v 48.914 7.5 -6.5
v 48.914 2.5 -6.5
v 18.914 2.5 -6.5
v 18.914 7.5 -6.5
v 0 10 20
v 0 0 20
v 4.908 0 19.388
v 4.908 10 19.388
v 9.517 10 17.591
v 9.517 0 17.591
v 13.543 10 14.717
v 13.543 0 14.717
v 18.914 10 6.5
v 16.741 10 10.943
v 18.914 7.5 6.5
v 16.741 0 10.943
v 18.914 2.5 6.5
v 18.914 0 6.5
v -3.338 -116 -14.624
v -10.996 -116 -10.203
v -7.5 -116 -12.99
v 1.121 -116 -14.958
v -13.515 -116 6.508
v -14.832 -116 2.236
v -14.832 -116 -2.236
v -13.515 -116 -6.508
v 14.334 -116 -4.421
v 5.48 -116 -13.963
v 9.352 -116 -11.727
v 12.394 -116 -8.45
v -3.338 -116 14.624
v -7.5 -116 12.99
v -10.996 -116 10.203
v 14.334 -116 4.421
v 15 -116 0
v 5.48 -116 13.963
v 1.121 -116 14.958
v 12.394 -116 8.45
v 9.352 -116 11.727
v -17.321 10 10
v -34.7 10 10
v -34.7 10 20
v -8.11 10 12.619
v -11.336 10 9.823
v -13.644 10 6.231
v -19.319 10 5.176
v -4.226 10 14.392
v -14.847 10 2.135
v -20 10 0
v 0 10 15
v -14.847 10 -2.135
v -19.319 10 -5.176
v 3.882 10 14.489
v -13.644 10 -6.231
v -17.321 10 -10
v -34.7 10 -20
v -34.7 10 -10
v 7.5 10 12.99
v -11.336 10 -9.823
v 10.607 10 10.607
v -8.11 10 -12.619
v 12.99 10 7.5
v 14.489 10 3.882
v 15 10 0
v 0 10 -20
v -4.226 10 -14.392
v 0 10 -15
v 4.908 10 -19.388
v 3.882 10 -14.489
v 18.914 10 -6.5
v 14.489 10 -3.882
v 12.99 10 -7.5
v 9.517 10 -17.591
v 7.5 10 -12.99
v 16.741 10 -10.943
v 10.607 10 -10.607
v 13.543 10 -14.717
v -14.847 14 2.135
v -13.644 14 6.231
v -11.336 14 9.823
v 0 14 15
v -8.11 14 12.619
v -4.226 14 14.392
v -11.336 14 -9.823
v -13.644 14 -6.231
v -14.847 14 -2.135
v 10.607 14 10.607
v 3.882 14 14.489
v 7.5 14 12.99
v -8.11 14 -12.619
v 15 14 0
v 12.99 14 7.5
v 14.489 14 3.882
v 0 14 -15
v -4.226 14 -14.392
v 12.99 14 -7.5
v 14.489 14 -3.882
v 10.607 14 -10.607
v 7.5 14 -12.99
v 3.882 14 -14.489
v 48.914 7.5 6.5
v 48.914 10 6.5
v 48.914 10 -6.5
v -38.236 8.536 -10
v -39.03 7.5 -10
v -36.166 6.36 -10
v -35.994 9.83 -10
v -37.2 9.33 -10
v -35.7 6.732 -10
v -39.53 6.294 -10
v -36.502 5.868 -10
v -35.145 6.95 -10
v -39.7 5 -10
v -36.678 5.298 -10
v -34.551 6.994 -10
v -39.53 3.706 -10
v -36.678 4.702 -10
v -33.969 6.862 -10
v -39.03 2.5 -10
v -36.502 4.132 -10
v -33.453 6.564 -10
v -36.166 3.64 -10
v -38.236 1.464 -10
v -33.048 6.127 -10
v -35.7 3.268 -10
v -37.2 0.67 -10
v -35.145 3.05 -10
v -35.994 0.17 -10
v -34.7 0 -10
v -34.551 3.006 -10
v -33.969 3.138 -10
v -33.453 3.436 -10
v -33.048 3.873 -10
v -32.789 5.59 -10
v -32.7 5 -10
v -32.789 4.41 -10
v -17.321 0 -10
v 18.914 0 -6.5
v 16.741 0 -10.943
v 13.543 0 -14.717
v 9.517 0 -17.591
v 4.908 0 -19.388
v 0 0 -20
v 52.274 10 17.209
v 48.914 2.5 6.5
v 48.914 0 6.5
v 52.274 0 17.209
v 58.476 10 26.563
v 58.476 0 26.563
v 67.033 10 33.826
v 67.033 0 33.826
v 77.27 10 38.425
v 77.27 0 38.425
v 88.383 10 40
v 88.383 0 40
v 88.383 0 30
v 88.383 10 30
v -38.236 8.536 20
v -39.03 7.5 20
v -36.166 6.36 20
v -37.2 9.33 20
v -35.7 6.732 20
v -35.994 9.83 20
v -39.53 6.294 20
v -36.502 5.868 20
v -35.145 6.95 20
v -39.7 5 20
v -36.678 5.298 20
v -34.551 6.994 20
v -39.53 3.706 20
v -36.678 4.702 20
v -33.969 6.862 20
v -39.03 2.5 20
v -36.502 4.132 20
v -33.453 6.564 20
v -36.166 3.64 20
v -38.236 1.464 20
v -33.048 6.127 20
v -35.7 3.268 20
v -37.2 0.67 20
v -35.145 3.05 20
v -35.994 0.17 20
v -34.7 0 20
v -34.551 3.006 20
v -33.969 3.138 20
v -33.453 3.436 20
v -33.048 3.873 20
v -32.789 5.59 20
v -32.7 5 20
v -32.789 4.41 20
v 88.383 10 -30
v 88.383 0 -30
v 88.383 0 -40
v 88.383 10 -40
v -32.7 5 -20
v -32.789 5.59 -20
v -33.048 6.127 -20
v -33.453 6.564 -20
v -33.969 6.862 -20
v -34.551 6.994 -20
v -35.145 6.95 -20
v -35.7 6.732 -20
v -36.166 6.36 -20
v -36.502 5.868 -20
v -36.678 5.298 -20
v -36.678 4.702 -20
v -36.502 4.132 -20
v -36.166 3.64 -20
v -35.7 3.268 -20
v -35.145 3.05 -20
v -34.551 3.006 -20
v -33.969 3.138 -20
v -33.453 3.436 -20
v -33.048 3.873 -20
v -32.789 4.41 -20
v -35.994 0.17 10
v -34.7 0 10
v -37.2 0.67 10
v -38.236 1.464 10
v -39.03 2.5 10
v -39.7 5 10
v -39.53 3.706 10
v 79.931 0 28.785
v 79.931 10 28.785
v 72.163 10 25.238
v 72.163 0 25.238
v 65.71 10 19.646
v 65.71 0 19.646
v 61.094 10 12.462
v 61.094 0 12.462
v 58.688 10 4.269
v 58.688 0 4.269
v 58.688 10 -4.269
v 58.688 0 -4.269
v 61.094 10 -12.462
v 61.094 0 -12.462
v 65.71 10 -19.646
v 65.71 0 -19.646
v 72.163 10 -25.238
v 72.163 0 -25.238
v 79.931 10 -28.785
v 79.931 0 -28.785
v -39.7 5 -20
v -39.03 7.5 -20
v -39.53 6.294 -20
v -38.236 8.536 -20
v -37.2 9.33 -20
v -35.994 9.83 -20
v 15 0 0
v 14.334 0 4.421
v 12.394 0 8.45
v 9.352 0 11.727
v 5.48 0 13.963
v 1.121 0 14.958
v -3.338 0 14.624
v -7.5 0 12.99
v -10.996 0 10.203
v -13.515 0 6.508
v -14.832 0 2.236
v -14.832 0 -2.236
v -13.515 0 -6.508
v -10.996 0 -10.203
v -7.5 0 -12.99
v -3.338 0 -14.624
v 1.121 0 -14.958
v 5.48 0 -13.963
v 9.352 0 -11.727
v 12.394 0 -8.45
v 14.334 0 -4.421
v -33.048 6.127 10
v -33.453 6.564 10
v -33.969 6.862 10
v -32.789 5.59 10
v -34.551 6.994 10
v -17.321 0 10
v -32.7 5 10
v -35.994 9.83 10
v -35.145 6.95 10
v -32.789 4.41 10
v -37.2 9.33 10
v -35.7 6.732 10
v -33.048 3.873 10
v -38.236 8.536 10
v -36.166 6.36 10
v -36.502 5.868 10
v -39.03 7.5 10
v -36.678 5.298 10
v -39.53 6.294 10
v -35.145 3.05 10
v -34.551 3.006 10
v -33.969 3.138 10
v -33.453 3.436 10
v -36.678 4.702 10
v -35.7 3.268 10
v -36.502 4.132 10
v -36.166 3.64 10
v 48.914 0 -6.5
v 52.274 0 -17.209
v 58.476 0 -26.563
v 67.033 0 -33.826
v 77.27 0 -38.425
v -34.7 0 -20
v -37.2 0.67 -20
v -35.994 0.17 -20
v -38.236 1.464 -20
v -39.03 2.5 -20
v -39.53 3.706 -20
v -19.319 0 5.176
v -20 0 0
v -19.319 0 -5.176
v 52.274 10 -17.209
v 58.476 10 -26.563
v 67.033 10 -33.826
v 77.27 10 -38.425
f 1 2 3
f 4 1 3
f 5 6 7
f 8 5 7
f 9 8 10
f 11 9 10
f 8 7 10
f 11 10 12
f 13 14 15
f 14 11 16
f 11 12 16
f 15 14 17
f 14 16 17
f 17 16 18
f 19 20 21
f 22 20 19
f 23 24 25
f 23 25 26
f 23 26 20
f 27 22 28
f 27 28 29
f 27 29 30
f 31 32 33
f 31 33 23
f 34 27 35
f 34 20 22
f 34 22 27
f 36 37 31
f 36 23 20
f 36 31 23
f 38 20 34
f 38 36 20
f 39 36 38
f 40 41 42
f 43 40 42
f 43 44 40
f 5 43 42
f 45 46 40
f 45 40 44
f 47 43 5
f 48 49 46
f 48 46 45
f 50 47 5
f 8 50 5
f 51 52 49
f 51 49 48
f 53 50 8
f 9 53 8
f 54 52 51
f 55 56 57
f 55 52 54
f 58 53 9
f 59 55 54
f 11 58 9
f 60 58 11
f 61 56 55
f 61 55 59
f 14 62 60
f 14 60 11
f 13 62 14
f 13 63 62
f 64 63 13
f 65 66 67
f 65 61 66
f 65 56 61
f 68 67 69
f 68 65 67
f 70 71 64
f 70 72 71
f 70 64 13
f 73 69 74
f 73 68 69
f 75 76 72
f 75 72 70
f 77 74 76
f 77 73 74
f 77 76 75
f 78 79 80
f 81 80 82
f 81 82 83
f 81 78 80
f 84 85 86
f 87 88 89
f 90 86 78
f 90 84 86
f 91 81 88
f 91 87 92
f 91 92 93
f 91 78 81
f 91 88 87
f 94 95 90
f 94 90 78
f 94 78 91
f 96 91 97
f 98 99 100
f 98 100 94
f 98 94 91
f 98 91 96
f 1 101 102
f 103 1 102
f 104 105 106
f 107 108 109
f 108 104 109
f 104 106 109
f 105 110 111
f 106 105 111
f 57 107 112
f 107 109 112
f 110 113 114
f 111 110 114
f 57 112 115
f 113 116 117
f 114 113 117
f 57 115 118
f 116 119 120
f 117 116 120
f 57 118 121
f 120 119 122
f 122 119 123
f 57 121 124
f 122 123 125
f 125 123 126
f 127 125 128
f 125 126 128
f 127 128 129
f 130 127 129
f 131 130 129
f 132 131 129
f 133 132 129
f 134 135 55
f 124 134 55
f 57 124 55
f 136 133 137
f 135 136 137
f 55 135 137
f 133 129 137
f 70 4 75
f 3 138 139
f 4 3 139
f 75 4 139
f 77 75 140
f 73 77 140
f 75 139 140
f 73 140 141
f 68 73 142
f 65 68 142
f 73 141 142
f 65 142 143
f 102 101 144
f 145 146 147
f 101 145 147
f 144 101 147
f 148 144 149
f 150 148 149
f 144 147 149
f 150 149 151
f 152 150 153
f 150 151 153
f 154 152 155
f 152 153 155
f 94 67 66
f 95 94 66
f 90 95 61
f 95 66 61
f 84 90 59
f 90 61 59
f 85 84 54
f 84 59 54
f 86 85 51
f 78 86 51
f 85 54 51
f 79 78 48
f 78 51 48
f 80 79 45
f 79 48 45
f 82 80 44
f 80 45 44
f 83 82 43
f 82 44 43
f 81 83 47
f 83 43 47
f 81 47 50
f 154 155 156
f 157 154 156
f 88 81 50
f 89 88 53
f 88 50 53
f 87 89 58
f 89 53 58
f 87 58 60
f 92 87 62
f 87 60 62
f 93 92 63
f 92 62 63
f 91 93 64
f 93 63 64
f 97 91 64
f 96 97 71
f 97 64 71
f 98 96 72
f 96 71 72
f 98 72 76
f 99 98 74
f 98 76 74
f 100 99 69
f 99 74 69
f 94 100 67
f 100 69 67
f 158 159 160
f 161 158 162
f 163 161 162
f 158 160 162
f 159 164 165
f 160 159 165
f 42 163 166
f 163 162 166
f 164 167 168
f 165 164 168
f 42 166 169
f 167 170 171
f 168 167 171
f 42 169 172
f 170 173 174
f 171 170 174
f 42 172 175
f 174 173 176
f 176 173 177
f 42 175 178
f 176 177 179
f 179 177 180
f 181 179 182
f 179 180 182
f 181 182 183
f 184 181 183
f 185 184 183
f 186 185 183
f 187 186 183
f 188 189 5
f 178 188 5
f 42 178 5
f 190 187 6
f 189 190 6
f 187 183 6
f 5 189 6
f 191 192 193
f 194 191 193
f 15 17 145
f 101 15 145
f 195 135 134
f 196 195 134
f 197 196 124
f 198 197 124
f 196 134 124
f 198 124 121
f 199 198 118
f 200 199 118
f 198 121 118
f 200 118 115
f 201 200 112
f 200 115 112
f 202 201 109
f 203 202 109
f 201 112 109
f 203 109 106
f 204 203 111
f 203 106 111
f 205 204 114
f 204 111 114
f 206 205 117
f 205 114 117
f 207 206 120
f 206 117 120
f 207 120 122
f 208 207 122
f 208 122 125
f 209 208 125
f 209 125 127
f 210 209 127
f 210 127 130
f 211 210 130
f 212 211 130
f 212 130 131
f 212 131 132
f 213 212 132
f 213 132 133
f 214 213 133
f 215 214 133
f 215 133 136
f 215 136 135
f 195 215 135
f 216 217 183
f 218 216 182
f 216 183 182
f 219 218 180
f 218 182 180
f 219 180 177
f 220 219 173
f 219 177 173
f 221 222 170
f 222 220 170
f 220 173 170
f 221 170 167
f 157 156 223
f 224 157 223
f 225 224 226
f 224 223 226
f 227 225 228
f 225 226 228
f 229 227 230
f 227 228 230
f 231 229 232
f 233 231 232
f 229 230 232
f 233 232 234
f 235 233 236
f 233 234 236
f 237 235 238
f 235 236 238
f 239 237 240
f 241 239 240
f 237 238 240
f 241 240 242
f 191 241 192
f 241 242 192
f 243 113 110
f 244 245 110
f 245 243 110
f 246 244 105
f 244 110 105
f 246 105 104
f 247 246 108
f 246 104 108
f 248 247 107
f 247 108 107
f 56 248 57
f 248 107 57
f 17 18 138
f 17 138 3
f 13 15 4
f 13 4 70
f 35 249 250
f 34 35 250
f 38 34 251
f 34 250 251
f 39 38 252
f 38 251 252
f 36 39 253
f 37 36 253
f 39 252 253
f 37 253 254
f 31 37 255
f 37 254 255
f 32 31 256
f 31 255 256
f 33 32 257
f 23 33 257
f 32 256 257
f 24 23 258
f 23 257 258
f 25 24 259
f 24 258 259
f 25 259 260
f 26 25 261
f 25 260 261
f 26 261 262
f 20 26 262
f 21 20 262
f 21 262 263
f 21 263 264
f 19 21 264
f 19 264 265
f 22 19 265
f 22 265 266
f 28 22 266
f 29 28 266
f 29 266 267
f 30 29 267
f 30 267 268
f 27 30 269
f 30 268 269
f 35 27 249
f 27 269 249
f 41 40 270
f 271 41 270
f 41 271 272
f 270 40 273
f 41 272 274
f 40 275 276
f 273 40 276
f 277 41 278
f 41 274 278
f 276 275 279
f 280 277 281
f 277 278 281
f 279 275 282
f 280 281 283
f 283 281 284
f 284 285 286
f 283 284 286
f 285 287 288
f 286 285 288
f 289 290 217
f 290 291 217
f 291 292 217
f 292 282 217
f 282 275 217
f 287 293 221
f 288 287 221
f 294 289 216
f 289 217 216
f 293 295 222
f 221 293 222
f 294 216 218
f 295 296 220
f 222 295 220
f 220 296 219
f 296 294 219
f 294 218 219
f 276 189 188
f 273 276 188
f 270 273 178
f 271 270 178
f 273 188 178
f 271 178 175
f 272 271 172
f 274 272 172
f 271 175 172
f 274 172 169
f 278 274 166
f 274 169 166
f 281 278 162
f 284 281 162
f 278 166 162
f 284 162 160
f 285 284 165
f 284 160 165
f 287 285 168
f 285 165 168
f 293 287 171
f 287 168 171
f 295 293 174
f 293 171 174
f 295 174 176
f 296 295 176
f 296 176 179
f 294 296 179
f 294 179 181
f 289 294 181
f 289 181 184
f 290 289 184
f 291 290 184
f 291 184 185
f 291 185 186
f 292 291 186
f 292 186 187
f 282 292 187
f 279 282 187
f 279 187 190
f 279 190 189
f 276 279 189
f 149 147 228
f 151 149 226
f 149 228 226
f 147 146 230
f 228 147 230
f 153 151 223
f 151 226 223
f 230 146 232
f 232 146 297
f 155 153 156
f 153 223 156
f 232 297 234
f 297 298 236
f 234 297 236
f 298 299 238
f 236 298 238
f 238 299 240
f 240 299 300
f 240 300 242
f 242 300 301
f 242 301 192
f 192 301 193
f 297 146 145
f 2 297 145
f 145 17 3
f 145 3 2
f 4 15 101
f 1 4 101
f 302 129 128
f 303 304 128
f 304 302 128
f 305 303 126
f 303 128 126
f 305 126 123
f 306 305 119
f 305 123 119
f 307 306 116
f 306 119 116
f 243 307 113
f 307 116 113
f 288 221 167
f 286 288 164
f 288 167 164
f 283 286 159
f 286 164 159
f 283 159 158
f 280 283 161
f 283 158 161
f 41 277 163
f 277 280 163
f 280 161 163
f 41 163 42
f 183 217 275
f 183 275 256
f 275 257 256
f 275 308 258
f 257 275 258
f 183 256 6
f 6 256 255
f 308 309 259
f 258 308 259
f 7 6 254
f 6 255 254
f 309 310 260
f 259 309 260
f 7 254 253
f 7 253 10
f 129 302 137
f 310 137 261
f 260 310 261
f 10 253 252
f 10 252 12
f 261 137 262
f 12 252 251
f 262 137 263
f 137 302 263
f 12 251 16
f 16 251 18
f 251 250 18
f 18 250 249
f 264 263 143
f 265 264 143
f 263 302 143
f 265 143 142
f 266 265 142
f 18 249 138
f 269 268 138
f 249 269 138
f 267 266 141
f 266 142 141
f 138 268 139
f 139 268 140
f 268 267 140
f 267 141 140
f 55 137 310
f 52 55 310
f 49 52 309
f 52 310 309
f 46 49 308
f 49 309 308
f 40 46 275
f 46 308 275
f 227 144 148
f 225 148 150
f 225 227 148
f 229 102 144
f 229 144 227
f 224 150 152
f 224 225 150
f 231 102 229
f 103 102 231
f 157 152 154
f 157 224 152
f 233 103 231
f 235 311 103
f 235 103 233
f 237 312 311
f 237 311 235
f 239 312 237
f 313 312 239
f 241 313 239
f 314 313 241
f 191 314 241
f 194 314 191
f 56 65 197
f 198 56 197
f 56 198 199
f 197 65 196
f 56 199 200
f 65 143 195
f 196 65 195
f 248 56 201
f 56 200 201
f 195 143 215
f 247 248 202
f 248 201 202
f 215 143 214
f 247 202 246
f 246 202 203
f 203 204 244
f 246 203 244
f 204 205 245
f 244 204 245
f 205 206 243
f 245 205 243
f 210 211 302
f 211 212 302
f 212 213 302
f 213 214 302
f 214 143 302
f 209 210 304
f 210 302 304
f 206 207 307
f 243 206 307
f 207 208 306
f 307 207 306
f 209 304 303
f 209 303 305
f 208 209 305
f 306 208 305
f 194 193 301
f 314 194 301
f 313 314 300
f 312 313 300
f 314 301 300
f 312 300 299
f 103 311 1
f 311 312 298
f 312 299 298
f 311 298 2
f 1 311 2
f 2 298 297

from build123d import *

# Parameters (mm, degrees)
SKETCH2_R               = 15
BOSS_EXTRUDE3_DEPTH     = 10
SKETCH4_R               = 2
CUT_EXTRUDE2_DEPTH      = 21
CUT_EXTRUDE2_DEPTH_BACK = 61
BOSS_EXTRUDE5_DEPTH     = 14
SKETCH5_R               = 15
BOSS_EXTRUDE6_DEPTH     = 116
SKETCH6_W               = 30
SKETCH6_H               = 2.5
CUT_EXTRUDE3_DEPTH      = 34.5
CUT_EXTRUDE3_DEPTH_BACK = 47.5


with BuildPart() as part:
    # Sketch2 → Boss-Extrude3 (new body)
    with BuildSketch(Plane(origin=(0, 0, 0), x_dir=(1, 0, 0), z_dir=(0, 1, 0))):
        with BuildLine():
            Line((88.382622063, 30), (88.382622063, 40))
            ThreePointArc((88.382622063, 40), (62.498263852, 30.495901364), (48.914280319, 6.5))
            Line((48.914280319, 6.5), (18.914280319, 6.5))
            ThreePointArc((18.914280319, 6.5), (11.618950039, 16.278820596), (0, 20))
            Line((0, 20), (-39.7, 20))
            Line((-39.7, 20), (-39.7, 10))
            Line((-39.7, 10), (-17.320508076, 10))
            ThreePointArc((-17.320508076, 10), (-20, 0), (-17.320508076, -10))
            Line((-17.320508076, -10), (-39.7, -10))
            Line((-39.7, -10), (-39.7, -20))
            Line((-39.7, -20), (0, -20))
            ThreePointArc((0, -20), (11.618950039, -16.278820596), (18.914280319, -6.5))
            Line((18.914280319, -6.5), (48.914280319, -6.5))
            ThreePointArc((48.914280319, -6.5), (62.498263852, -30.495901364), (88.382622063, -40))
            Line((88.382622063, -40), (88.382622063, -30))
            ThreePointArc((88.382622063, -30), (58.382622063, 0), (88.382622063, 30))
        make_face()
        Circle(SKETCH2_R, mode=Mode.SUBTRACT)
    extrude(amount=BOSS_EXTRUDE3_DEPTH)

    # Sketch4 → Cut-Extrude2 (cut, two sides)
    with BuildSketch(Plane.XY.offset(20)) as cut_extrude2_sk:
        with BuildLine():
            Line((-34.7, 10), (-39.7, 10))
            Line((-39.7, 10), (-39.7, 5))
            ThreePointArc((-39.7, 5), (-38.235533906, 8.535533906), (-34.7, 10))
        make_face()
        with BuildLine():
            ThreePointArc((-34.7, 0), (-38.235533906, 1.464466094), (-39.7, 5))
            Line((-39.7, 5), (-39.7, 0))
            Line((-39.7, 0), (-34.7, 0))
        make_face()
        with Locations((-34.7, 5)):
            Circle(SKETCH4_R)
    extrude(amount=CUT_EXTRUDE2_DEPTH, mode=Mode.SUBTRACT)
    extrude(cut_extrude2_sk.sketch, amount=-CUT_EXTRUDE2_DEPTH_BACK, mode=Mode.SUBTRACT)

    # Sketch2<6> → Boss-Extrude5 (add)
    with BuildSketch(Plane(origin=(0, 0, 0), x_dir=(1, 0, 0), z_dir=(0, 1, 0))):
        with BuildLine():
            ThreePointArc((15, 0), (10.606601718, 10.606601718), (0, 15))
            Line((0, 15), (0, -15))
            ThreePointArc((0, -15), (10.606601718, -10.606601718), (15, 0))
        make_face()
        with BuildLine():
            Line((0, -15), (0, 15))
            ThreePointArc((0, 15), (-15, 0), (0, -15))
        make_face()
    extrude(amount=BOSS_EXTRUDE5_DEPTH)

    # Sketch5 → Boss-Extrude6 (add)
    with BuildSketch(Plane.XZ):
        Circle(SKETCH5_R)
    extrude(amount=BOSS_EXTRUDE6_DEPTH)

    # Sketch6 → Cut-Extrude3 (cut, two sides)
    with BuildSketch(Plane.XY.offset(6.5)) as cut_extrude3_sk:
        with Locations((33.914280319, 8.75)):
            Rectangle(SKETCH6_W, SKETCH6_H)
        with Locations((33.914280319, 1.25)):
            Rectangle(SKETCH6_W, SKETCH6_H)
    extrude(amount=CUT_EXTRUDE3_DEPTH, mode=Mode.SUBTRACT)
    extrude(cut_extrude3_sk.sketch, amount=-CUT_EXTRUDE3_DEPTH_BACK, mode=Mode.SUBTRACT)


solid = part.part
